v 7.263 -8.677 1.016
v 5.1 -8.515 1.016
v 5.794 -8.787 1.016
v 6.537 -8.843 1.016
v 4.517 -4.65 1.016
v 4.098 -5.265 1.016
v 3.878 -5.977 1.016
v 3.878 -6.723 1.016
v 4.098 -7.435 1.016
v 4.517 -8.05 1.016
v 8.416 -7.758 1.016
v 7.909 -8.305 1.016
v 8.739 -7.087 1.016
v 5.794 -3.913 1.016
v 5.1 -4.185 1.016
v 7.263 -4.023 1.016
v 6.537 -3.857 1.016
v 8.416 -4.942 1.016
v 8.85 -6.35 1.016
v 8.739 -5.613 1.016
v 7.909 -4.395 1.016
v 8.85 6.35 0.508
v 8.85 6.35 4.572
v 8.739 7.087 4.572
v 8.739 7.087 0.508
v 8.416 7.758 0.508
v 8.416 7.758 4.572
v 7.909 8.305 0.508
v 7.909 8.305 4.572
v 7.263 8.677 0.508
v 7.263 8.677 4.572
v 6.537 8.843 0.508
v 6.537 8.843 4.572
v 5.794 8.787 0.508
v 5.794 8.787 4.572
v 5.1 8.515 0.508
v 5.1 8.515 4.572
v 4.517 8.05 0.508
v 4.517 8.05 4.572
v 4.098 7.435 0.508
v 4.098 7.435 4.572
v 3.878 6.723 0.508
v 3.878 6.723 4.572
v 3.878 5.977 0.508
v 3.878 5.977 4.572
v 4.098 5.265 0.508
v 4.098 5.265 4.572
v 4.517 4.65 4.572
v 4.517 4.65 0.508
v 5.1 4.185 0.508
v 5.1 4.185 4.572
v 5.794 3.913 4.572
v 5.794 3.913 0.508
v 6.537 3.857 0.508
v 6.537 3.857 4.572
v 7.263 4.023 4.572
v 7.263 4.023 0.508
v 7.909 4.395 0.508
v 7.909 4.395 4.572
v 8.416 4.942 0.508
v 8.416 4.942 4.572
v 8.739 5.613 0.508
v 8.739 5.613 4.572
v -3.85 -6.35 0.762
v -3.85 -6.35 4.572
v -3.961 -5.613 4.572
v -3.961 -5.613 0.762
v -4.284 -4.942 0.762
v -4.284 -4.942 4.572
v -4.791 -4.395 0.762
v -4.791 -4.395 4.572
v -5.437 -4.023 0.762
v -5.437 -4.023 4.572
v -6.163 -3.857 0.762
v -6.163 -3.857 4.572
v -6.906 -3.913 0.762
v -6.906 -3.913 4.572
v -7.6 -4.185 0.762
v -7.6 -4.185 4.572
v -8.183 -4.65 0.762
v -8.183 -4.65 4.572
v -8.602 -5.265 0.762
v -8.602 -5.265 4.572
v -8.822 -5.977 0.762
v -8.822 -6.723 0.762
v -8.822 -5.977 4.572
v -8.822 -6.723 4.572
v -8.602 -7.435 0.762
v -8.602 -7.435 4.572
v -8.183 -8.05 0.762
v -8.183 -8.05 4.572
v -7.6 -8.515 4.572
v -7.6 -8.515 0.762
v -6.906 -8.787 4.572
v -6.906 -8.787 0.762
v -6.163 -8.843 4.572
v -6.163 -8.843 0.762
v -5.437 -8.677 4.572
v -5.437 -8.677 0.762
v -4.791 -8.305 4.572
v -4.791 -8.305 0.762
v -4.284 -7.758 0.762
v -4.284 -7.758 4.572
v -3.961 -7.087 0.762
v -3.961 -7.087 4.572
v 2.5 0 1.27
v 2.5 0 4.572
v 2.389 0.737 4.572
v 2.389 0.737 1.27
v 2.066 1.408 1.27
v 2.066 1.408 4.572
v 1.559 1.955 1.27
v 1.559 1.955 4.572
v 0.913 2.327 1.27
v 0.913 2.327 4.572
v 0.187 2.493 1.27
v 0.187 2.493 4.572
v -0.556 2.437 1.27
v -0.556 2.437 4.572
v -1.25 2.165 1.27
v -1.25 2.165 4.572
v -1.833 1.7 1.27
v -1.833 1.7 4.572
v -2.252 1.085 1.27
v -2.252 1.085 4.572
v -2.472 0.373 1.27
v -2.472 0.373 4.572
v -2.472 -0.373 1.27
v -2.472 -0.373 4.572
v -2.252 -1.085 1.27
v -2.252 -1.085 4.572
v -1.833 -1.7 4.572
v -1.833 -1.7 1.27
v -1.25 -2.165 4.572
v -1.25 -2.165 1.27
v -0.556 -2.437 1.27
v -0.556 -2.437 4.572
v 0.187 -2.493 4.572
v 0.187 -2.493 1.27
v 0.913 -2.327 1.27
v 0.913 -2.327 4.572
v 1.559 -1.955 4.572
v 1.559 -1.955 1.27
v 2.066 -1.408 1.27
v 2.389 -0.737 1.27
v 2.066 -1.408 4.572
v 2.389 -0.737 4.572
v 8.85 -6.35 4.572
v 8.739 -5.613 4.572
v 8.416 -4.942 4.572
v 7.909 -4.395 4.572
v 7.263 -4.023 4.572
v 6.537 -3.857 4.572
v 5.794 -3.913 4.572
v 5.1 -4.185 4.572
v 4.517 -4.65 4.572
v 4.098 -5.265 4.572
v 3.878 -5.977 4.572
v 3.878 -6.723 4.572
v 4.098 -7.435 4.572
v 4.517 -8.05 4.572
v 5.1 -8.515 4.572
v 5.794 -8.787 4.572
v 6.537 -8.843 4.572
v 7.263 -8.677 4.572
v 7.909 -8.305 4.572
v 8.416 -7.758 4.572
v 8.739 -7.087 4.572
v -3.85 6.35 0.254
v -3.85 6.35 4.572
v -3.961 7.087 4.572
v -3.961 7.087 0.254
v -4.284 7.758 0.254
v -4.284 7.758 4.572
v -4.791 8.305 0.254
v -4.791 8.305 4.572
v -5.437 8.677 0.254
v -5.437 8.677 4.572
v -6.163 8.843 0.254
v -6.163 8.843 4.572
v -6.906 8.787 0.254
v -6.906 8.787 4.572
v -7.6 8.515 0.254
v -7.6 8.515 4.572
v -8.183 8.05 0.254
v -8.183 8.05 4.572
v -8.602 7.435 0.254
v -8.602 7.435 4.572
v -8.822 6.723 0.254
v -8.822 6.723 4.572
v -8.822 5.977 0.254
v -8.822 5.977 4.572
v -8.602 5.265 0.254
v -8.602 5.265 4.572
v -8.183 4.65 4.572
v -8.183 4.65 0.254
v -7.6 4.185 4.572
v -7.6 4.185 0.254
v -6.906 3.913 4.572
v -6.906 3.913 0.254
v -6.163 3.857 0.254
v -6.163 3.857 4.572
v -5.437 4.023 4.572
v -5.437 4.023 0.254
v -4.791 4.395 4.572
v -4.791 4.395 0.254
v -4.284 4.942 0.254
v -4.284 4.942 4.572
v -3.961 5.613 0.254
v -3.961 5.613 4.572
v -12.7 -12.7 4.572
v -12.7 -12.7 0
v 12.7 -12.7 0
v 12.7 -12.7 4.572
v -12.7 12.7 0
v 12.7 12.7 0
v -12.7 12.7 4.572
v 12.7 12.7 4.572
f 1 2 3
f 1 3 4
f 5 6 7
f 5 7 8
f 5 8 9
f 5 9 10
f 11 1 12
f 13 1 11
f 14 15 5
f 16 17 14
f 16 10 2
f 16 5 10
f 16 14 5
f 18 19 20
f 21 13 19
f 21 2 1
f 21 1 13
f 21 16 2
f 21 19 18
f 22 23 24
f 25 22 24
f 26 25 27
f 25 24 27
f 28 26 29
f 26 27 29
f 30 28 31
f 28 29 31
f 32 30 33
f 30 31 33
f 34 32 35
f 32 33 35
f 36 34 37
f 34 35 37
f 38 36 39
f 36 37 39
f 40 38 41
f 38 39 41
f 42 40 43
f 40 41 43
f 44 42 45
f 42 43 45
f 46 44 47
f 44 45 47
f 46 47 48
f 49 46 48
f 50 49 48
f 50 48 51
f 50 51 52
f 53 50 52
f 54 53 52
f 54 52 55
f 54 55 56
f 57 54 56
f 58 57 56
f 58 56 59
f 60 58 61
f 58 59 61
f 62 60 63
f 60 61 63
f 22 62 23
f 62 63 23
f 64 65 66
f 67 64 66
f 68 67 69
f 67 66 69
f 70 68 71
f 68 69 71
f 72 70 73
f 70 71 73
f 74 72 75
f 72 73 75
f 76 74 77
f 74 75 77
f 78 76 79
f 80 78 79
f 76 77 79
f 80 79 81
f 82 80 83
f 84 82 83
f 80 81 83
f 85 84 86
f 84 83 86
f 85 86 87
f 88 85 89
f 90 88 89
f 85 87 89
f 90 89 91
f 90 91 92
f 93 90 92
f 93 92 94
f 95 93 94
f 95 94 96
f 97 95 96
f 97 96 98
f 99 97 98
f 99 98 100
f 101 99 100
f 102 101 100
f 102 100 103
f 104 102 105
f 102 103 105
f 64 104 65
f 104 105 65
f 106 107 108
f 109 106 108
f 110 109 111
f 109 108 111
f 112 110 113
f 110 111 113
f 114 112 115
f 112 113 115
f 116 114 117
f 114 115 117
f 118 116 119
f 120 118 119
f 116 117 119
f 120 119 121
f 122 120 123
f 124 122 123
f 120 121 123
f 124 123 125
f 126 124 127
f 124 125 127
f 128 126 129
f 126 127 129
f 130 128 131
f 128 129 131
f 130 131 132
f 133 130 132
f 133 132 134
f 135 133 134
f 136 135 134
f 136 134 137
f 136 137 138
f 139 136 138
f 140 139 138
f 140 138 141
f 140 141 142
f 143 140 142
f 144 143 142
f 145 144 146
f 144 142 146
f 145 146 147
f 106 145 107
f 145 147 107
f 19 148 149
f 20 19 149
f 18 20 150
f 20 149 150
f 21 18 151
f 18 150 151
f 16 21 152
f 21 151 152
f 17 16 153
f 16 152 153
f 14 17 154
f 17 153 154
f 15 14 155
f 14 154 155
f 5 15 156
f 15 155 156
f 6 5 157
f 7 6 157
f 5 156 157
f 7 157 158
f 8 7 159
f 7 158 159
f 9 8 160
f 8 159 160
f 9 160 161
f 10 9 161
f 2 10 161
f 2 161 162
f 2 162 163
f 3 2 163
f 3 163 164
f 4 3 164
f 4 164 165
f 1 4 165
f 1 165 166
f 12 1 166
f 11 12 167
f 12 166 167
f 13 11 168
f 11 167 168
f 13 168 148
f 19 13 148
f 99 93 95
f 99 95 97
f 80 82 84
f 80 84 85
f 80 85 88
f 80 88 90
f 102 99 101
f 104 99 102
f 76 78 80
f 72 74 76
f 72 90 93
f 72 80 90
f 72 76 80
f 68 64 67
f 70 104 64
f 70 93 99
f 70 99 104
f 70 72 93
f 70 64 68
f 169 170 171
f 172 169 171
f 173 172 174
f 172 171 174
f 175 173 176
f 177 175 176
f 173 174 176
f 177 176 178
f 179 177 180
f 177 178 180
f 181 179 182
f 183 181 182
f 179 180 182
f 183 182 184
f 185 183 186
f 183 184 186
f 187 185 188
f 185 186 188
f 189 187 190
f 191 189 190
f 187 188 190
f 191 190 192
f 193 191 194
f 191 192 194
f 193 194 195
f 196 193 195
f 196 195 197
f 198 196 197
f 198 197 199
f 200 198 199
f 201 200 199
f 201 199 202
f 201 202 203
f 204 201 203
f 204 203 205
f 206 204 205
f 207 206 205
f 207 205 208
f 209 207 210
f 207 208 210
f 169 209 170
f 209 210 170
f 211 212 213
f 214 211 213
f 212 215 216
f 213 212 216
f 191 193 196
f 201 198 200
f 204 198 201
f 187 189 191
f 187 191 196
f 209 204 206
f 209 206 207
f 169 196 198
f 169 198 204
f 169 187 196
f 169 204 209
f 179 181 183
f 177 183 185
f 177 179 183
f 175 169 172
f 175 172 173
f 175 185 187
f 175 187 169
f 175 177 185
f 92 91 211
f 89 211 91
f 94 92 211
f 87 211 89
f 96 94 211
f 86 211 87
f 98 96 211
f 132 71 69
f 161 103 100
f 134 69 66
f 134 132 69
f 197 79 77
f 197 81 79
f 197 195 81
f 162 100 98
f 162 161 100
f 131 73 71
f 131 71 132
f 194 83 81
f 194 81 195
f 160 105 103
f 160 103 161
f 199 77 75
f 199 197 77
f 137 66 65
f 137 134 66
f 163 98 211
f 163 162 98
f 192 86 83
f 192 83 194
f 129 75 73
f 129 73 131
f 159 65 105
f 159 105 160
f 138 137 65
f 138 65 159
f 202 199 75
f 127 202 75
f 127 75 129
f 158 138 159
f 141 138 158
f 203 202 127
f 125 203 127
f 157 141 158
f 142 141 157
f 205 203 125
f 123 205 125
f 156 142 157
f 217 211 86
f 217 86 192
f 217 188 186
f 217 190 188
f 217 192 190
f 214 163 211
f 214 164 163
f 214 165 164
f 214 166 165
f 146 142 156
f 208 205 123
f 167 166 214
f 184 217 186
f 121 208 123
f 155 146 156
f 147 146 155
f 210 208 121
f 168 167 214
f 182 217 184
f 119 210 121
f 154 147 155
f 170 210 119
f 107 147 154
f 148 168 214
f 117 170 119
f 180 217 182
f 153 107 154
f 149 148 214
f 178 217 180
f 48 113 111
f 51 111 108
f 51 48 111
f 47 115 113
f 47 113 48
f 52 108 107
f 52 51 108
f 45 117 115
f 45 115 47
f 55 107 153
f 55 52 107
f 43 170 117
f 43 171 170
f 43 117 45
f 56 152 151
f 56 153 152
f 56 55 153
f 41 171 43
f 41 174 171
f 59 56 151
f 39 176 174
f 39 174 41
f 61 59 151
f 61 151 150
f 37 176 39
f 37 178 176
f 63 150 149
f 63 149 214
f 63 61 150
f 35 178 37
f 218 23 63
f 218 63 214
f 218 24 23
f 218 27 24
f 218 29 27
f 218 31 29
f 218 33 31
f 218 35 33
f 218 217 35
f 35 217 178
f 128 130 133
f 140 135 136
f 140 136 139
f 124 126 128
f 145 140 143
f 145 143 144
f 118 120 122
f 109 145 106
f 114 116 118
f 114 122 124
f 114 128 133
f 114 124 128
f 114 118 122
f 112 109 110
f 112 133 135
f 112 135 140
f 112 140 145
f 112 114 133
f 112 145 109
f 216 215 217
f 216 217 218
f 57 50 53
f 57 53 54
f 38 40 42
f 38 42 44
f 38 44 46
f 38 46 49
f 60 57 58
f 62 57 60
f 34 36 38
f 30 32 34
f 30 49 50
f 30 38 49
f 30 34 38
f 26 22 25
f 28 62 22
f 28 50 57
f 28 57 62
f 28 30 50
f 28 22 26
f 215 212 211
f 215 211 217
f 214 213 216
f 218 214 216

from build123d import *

# Parameters (mm, degrees)
F0_W      = 25.4
F0_H      = 25.399996
F1_DEPTH  = 4.572
F2_R      = 2.5
F3_DEPTH  = 4.318
F4_R      = 2.5
F5_DEPTH  = 4.064
F6_R      = 2.5
F7_DEPTH  = 3.81
F8_R      = 2.5
F9_DEPTH  = 3.556
F10_R     = 2.5
F11_DEPTH = 3.302


with BuildPart() as f1:
    # F0 (on Top) → F1 (new body)
    with BuildSketch(Plane.XY):
        Rectangle(F0_W, F0_H)
    extrude(amount=F1_DEPTH)

    # F2 (on face) → F3 (cut)
    with BuildSketch(Plane.XY.offset(4.572)):
        with Locations((-6.35, 6.35)):
            Circle(F2_R)
    extrude(amount=-F3_DEPTH, mode=Mode.SUBTRACT)

    # F4 (on face) → F5 (cut)
    with BuildSketch(Plane.XY.offset(4.572)):
        with Locations((6.35, 6.349998)):
            Circle(F4_R)
    extrude(amount=-F5_DEPTH, mode=Mode.SUBTRACT)

    # F6 (on face) → F7 (cut)
    with BuildSketch(Plane.XY.offset(4.572)):
        with Locations((-6.35, -6.349998)):
            Circle(F6_R)
    extrude(amount=-F7_DEPTH, mode=Mode.SUBTRACT)

    # F8 (on face) → F9 (cut)
    with BuildSketch(Plane.XY.offset(4.572)):
        with Locations((6.35, -6.349998)):
            Circle(F8_R)
    extrude(amount=-F9_DEPTH, mode=Mode.SUBTRACT)

    # F10 (on face) → F11 (cut)
    with BuildSketch(Plane.XY.offset(4.572)):
        Circle(F10_R)
    extrude(amount=-F11_DEPTH, mode=Mode.SUBTRACT)


solid = f1.part
